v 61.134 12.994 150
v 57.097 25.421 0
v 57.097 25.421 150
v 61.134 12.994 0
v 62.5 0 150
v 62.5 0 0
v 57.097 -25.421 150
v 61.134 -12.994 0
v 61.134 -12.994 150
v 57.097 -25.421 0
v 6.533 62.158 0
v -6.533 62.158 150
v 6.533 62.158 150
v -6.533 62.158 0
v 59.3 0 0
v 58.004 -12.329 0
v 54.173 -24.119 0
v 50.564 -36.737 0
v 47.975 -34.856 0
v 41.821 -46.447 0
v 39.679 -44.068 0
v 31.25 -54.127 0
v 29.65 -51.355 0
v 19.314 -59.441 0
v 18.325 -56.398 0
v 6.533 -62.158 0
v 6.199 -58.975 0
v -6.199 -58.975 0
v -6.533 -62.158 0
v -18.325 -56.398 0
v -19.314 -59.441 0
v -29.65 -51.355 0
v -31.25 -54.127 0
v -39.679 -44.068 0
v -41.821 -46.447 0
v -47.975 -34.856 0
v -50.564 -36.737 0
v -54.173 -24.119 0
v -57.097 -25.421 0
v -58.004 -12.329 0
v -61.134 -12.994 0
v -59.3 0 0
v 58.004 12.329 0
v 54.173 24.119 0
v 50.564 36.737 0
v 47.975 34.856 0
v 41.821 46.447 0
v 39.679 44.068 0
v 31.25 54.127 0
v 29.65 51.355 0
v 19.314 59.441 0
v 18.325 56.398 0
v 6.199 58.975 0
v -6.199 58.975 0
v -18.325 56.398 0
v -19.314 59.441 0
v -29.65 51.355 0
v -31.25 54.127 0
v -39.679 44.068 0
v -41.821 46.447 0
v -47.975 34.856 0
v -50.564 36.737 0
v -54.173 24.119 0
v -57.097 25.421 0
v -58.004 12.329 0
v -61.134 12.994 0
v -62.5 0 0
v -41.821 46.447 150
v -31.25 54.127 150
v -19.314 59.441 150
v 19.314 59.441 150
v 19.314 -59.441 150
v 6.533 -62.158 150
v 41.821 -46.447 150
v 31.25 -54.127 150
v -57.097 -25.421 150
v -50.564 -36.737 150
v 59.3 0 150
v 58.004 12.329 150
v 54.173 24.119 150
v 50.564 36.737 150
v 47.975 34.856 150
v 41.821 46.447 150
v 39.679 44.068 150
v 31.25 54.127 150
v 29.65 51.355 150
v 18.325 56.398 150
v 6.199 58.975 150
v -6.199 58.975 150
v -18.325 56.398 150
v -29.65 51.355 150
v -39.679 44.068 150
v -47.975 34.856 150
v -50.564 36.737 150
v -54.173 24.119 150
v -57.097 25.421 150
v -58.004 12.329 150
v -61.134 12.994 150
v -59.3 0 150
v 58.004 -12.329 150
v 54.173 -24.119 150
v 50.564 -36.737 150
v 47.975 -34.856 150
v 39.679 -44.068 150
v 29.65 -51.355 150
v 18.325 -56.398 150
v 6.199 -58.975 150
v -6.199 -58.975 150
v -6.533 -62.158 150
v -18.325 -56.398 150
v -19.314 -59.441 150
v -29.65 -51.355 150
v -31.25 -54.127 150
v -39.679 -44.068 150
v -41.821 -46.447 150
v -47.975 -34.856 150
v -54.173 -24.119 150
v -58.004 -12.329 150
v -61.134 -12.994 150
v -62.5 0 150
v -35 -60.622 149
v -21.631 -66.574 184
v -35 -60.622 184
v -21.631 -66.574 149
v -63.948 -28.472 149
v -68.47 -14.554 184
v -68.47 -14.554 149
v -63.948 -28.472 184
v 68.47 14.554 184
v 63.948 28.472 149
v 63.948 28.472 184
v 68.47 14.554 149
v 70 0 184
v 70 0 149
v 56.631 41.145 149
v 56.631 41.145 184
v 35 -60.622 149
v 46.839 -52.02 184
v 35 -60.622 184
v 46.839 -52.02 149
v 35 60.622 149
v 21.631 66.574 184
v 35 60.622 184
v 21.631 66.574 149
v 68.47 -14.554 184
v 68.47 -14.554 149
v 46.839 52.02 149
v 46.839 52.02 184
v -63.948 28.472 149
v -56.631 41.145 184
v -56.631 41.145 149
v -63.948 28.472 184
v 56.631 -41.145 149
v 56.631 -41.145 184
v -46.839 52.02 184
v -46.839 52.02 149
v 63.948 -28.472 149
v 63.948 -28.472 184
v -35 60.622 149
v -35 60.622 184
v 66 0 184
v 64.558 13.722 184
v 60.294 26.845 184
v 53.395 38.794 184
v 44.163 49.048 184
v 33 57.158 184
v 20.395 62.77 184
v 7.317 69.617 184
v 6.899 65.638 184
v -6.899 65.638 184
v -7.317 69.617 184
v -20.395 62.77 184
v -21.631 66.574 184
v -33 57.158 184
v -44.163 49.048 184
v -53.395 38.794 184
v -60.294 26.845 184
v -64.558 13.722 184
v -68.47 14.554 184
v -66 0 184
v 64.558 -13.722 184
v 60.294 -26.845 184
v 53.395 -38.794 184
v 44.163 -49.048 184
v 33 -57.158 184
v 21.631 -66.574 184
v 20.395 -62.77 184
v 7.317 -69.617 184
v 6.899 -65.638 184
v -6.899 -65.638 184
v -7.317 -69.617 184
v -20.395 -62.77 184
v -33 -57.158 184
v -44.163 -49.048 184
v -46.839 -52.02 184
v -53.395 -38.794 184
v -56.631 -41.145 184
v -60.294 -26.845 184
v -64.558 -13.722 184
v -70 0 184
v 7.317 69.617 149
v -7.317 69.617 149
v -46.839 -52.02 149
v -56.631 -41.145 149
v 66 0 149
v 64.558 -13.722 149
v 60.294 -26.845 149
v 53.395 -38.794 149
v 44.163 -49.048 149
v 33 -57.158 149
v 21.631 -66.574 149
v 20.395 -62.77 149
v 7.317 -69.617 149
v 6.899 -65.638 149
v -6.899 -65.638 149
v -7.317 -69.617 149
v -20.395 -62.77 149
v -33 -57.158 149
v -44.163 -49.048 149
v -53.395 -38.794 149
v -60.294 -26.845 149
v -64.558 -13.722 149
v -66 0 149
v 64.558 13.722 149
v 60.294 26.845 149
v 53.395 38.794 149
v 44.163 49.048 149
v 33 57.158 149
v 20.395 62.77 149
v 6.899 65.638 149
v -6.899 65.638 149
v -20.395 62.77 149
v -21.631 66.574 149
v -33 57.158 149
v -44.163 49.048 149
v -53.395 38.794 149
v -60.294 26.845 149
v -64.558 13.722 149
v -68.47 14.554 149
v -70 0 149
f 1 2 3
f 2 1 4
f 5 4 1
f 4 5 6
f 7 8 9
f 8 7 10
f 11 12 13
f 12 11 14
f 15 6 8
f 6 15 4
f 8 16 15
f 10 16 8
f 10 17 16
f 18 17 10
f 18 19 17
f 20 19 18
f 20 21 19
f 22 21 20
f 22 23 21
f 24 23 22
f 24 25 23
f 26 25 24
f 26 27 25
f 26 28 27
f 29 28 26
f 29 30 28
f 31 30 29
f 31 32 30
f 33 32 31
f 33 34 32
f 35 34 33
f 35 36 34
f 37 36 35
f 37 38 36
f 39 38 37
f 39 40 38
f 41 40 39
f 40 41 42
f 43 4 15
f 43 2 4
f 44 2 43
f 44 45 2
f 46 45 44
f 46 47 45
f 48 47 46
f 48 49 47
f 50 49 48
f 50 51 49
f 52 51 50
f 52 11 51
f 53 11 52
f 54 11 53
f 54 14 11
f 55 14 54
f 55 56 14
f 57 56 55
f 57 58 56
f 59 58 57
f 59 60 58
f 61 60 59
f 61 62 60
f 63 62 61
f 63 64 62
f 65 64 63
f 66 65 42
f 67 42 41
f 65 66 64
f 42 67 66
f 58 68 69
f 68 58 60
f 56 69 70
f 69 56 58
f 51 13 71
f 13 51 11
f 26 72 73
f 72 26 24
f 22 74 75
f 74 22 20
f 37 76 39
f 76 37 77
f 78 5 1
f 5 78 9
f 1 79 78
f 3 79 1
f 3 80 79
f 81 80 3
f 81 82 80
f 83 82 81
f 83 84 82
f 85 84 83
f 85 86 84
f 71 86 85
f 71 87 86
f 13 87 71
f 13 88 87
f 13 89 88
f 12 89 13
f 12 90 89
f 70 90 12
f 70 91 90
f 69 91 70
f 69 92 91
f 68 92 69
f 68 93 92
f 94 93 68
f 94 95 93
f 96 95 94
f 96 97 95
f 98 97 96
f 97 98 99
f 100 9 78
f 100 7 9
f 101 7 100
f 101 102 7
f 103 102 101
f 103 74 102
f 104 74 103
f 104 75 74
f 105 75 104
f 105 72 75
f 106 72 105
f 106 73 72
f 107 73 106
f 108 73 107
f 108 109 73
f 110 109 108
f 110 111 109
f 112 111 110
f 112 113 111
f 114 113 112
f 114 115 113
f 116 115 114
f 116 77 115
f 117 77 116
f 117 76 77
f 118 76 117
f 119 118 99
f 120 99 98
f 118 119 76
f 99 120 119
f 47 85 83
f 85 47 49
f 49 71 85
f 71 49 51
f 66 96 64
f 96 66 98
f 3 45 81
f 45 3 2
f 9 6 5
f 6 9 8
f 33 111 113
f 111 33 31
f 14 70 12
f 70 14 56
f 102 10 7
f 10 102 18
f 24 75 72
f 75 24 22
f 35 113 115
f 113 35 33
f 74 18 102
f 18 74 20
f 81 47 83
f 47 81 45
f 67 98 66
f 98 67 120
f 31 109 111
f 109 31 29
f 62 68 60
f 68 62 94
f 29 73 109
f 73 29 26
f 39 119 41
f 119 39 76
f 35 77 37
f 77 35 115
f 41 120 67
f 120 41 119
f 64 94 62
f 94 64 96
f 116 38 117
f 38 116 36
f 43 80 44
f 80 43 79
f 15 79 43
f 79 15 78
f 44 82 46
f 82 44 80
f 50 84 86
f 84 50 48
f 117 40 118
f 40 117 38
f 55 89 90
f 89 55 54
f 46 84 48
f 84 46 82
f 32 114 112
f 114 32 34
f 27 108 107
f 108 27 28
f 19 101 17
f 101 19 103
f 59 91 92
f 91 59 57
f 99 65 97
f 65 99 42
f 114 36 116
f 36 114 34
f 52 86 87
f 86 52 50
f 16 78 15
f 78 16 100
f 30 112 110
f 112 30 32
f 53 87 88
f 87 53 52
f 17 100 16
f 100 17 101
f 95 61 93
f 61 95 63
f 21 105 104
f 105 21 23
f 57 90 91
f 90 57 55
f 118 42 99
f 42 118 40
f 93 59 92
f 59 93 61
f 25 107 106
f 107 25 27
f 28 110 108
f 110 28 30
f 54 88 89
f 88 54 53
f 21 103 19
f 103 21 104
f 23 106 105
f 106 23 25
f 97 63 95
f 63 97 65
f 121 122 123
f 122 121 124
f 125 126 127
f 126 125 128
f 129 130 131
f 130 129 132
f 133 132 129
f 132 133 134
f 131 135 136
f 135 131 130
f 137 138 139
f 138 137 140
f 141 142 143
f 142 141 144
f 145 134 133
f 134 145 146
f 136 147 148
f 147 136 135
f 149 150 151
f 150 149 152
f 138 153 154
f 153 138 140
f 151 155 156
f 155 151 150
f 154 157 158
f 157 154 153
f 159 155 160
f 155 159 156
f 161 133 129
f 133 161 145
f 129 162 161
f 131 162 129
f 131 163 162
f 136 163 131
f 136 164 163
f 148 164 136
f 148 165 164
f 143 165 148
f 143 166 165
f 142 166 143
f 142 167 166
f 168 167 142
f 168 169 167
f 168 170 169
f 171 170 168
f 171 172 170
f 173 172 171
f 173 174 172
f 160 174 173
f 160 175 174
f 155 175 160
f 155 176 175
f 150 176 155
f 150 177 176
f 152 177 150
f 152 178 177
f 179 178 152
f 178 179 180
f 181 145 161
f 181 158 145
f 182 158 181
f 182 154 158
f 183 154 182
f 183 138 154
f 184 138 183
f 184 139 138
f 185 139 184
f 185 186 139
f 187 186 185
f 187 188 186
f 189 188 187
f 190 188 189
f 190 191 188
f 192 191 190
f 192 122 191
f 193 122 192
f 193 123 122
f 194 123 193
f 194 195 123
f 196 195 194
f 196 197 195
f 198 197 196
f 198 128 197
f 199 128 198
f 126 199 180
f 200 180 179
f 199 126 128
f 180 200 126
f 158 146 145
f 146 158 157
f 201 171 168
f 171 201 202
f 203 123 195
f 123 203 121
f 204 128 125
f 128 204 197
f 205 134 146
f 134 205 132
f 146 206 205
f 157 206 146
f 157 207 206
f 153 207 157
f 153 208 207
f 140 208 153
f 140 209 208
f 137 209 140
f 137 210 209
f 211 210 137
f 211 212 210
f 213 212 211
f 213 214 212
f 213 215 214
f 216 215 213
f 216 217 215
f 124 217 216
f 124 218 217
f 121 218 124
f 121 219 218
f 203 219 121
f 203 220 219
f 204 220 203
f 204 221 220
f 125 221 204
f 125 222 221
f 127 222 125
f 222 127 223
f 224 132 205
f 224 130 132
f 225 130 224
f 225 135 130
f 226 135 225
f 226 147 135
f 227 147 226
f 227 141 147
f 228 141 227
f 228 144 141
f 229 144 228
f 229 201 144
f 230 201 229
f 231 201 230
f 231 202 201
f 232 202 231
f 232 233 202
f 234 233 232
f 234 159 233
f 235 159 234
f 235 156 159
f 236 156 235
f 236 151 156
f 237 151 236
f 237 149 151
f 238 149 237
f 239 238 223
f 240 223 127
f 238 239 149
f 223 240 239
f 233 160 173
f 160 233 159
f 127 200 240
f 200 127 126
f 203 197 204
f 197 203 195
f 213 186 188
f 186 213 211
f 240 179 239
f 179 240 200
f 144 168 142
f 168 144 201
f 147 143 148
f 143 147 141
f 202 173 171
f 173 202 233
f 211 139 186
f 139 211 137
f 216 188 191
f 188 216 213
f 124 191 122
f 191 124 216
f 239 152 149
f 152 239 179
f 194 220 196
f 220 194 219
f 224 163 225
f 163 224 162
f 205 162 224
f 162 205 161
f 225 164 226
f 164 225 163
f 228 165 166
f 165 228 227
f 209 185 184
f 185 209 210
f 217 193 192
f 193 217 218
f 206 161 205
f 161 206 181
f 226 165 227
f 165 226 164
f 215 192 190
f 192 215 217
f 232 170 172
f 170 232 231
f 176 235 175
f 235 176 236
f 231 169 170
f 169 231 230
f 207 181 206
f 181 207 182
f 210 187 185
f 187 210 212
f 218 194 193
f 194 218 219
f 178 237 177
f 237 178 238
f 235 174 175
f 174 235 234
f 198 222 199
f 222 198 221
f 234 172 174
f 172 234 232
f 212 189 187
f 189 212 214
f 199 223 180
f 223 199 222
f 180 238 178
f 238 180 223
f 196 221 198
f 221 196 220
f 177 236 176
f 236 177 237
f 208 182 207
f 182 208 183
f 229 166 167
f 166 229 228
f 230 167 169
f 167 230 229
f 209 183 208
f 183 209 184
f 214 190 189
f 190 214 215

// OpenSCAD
// Parameters
length_mm = 150; //[75:300:1]
outer_diameter_mm = 125; //[62.5:250:0.5]
wall_thickness_mm = 3.2; //[1.6:6.4:0.1]
include_end_fitting = 1; //[0:1:1]
fitting_length_mm = 35; //[15:70:1]
fitting_outer_diameter_mm = 140; //[125:180:0.5]
fitting_socket_wall_mm = 4; //[2:8:0.1]
fitting_stop_thickness_mm = 3; //[1:8:0.1]
overlap_mm = 1; //[0.5:2:0.1]

// HT Pipe Segment - Complete Geometry
module ht_pipe() {
  color([0.85, 0.85, 0.8]) { // PVC color
    difference() {
      // Outer pipe
      cylinder(h=length_mm, r=outer_diameter_mm/2, center=false);
      // Hollow bore
      translate([0, 0, -overlap_mm])
        cylinder(h=length_mm + overlap_mm*2, r=outer_diameter_mm/2 - wall_thickness_mm, center=false);
    }
    
    if (include_end_fitting) {
      // End fitting
      difference() {
        translate([0, 0, length_mm - overlap_mm])
          cylinder(h=fitting_length_mm, r=fitting_outer_diameter_mm/2, center=false);
        // Socket cutter
        translate([0, 0, length_mm - overlap_mm*2])
          cylinder(h=fitting_length_mm + overlap_mm*2, r=fitting_outer_diameter_mm/2 - fitting_socket_wall_mm, center=false);
        // Stop ring cutter
        translate([0, 0, length_mm + fitting_length_mm - fitting_stop_thickness_mm - overlap_mm])
          cylinder(h=fitting_stop_thickness_mm + overlap_mm*2, r=outer_diameter_mm/2 - wall_thickness_mm, center=false);
      }
    }
  }
}

// Assembly
module assembly() {
  ht_pipe();
}

assembly();
